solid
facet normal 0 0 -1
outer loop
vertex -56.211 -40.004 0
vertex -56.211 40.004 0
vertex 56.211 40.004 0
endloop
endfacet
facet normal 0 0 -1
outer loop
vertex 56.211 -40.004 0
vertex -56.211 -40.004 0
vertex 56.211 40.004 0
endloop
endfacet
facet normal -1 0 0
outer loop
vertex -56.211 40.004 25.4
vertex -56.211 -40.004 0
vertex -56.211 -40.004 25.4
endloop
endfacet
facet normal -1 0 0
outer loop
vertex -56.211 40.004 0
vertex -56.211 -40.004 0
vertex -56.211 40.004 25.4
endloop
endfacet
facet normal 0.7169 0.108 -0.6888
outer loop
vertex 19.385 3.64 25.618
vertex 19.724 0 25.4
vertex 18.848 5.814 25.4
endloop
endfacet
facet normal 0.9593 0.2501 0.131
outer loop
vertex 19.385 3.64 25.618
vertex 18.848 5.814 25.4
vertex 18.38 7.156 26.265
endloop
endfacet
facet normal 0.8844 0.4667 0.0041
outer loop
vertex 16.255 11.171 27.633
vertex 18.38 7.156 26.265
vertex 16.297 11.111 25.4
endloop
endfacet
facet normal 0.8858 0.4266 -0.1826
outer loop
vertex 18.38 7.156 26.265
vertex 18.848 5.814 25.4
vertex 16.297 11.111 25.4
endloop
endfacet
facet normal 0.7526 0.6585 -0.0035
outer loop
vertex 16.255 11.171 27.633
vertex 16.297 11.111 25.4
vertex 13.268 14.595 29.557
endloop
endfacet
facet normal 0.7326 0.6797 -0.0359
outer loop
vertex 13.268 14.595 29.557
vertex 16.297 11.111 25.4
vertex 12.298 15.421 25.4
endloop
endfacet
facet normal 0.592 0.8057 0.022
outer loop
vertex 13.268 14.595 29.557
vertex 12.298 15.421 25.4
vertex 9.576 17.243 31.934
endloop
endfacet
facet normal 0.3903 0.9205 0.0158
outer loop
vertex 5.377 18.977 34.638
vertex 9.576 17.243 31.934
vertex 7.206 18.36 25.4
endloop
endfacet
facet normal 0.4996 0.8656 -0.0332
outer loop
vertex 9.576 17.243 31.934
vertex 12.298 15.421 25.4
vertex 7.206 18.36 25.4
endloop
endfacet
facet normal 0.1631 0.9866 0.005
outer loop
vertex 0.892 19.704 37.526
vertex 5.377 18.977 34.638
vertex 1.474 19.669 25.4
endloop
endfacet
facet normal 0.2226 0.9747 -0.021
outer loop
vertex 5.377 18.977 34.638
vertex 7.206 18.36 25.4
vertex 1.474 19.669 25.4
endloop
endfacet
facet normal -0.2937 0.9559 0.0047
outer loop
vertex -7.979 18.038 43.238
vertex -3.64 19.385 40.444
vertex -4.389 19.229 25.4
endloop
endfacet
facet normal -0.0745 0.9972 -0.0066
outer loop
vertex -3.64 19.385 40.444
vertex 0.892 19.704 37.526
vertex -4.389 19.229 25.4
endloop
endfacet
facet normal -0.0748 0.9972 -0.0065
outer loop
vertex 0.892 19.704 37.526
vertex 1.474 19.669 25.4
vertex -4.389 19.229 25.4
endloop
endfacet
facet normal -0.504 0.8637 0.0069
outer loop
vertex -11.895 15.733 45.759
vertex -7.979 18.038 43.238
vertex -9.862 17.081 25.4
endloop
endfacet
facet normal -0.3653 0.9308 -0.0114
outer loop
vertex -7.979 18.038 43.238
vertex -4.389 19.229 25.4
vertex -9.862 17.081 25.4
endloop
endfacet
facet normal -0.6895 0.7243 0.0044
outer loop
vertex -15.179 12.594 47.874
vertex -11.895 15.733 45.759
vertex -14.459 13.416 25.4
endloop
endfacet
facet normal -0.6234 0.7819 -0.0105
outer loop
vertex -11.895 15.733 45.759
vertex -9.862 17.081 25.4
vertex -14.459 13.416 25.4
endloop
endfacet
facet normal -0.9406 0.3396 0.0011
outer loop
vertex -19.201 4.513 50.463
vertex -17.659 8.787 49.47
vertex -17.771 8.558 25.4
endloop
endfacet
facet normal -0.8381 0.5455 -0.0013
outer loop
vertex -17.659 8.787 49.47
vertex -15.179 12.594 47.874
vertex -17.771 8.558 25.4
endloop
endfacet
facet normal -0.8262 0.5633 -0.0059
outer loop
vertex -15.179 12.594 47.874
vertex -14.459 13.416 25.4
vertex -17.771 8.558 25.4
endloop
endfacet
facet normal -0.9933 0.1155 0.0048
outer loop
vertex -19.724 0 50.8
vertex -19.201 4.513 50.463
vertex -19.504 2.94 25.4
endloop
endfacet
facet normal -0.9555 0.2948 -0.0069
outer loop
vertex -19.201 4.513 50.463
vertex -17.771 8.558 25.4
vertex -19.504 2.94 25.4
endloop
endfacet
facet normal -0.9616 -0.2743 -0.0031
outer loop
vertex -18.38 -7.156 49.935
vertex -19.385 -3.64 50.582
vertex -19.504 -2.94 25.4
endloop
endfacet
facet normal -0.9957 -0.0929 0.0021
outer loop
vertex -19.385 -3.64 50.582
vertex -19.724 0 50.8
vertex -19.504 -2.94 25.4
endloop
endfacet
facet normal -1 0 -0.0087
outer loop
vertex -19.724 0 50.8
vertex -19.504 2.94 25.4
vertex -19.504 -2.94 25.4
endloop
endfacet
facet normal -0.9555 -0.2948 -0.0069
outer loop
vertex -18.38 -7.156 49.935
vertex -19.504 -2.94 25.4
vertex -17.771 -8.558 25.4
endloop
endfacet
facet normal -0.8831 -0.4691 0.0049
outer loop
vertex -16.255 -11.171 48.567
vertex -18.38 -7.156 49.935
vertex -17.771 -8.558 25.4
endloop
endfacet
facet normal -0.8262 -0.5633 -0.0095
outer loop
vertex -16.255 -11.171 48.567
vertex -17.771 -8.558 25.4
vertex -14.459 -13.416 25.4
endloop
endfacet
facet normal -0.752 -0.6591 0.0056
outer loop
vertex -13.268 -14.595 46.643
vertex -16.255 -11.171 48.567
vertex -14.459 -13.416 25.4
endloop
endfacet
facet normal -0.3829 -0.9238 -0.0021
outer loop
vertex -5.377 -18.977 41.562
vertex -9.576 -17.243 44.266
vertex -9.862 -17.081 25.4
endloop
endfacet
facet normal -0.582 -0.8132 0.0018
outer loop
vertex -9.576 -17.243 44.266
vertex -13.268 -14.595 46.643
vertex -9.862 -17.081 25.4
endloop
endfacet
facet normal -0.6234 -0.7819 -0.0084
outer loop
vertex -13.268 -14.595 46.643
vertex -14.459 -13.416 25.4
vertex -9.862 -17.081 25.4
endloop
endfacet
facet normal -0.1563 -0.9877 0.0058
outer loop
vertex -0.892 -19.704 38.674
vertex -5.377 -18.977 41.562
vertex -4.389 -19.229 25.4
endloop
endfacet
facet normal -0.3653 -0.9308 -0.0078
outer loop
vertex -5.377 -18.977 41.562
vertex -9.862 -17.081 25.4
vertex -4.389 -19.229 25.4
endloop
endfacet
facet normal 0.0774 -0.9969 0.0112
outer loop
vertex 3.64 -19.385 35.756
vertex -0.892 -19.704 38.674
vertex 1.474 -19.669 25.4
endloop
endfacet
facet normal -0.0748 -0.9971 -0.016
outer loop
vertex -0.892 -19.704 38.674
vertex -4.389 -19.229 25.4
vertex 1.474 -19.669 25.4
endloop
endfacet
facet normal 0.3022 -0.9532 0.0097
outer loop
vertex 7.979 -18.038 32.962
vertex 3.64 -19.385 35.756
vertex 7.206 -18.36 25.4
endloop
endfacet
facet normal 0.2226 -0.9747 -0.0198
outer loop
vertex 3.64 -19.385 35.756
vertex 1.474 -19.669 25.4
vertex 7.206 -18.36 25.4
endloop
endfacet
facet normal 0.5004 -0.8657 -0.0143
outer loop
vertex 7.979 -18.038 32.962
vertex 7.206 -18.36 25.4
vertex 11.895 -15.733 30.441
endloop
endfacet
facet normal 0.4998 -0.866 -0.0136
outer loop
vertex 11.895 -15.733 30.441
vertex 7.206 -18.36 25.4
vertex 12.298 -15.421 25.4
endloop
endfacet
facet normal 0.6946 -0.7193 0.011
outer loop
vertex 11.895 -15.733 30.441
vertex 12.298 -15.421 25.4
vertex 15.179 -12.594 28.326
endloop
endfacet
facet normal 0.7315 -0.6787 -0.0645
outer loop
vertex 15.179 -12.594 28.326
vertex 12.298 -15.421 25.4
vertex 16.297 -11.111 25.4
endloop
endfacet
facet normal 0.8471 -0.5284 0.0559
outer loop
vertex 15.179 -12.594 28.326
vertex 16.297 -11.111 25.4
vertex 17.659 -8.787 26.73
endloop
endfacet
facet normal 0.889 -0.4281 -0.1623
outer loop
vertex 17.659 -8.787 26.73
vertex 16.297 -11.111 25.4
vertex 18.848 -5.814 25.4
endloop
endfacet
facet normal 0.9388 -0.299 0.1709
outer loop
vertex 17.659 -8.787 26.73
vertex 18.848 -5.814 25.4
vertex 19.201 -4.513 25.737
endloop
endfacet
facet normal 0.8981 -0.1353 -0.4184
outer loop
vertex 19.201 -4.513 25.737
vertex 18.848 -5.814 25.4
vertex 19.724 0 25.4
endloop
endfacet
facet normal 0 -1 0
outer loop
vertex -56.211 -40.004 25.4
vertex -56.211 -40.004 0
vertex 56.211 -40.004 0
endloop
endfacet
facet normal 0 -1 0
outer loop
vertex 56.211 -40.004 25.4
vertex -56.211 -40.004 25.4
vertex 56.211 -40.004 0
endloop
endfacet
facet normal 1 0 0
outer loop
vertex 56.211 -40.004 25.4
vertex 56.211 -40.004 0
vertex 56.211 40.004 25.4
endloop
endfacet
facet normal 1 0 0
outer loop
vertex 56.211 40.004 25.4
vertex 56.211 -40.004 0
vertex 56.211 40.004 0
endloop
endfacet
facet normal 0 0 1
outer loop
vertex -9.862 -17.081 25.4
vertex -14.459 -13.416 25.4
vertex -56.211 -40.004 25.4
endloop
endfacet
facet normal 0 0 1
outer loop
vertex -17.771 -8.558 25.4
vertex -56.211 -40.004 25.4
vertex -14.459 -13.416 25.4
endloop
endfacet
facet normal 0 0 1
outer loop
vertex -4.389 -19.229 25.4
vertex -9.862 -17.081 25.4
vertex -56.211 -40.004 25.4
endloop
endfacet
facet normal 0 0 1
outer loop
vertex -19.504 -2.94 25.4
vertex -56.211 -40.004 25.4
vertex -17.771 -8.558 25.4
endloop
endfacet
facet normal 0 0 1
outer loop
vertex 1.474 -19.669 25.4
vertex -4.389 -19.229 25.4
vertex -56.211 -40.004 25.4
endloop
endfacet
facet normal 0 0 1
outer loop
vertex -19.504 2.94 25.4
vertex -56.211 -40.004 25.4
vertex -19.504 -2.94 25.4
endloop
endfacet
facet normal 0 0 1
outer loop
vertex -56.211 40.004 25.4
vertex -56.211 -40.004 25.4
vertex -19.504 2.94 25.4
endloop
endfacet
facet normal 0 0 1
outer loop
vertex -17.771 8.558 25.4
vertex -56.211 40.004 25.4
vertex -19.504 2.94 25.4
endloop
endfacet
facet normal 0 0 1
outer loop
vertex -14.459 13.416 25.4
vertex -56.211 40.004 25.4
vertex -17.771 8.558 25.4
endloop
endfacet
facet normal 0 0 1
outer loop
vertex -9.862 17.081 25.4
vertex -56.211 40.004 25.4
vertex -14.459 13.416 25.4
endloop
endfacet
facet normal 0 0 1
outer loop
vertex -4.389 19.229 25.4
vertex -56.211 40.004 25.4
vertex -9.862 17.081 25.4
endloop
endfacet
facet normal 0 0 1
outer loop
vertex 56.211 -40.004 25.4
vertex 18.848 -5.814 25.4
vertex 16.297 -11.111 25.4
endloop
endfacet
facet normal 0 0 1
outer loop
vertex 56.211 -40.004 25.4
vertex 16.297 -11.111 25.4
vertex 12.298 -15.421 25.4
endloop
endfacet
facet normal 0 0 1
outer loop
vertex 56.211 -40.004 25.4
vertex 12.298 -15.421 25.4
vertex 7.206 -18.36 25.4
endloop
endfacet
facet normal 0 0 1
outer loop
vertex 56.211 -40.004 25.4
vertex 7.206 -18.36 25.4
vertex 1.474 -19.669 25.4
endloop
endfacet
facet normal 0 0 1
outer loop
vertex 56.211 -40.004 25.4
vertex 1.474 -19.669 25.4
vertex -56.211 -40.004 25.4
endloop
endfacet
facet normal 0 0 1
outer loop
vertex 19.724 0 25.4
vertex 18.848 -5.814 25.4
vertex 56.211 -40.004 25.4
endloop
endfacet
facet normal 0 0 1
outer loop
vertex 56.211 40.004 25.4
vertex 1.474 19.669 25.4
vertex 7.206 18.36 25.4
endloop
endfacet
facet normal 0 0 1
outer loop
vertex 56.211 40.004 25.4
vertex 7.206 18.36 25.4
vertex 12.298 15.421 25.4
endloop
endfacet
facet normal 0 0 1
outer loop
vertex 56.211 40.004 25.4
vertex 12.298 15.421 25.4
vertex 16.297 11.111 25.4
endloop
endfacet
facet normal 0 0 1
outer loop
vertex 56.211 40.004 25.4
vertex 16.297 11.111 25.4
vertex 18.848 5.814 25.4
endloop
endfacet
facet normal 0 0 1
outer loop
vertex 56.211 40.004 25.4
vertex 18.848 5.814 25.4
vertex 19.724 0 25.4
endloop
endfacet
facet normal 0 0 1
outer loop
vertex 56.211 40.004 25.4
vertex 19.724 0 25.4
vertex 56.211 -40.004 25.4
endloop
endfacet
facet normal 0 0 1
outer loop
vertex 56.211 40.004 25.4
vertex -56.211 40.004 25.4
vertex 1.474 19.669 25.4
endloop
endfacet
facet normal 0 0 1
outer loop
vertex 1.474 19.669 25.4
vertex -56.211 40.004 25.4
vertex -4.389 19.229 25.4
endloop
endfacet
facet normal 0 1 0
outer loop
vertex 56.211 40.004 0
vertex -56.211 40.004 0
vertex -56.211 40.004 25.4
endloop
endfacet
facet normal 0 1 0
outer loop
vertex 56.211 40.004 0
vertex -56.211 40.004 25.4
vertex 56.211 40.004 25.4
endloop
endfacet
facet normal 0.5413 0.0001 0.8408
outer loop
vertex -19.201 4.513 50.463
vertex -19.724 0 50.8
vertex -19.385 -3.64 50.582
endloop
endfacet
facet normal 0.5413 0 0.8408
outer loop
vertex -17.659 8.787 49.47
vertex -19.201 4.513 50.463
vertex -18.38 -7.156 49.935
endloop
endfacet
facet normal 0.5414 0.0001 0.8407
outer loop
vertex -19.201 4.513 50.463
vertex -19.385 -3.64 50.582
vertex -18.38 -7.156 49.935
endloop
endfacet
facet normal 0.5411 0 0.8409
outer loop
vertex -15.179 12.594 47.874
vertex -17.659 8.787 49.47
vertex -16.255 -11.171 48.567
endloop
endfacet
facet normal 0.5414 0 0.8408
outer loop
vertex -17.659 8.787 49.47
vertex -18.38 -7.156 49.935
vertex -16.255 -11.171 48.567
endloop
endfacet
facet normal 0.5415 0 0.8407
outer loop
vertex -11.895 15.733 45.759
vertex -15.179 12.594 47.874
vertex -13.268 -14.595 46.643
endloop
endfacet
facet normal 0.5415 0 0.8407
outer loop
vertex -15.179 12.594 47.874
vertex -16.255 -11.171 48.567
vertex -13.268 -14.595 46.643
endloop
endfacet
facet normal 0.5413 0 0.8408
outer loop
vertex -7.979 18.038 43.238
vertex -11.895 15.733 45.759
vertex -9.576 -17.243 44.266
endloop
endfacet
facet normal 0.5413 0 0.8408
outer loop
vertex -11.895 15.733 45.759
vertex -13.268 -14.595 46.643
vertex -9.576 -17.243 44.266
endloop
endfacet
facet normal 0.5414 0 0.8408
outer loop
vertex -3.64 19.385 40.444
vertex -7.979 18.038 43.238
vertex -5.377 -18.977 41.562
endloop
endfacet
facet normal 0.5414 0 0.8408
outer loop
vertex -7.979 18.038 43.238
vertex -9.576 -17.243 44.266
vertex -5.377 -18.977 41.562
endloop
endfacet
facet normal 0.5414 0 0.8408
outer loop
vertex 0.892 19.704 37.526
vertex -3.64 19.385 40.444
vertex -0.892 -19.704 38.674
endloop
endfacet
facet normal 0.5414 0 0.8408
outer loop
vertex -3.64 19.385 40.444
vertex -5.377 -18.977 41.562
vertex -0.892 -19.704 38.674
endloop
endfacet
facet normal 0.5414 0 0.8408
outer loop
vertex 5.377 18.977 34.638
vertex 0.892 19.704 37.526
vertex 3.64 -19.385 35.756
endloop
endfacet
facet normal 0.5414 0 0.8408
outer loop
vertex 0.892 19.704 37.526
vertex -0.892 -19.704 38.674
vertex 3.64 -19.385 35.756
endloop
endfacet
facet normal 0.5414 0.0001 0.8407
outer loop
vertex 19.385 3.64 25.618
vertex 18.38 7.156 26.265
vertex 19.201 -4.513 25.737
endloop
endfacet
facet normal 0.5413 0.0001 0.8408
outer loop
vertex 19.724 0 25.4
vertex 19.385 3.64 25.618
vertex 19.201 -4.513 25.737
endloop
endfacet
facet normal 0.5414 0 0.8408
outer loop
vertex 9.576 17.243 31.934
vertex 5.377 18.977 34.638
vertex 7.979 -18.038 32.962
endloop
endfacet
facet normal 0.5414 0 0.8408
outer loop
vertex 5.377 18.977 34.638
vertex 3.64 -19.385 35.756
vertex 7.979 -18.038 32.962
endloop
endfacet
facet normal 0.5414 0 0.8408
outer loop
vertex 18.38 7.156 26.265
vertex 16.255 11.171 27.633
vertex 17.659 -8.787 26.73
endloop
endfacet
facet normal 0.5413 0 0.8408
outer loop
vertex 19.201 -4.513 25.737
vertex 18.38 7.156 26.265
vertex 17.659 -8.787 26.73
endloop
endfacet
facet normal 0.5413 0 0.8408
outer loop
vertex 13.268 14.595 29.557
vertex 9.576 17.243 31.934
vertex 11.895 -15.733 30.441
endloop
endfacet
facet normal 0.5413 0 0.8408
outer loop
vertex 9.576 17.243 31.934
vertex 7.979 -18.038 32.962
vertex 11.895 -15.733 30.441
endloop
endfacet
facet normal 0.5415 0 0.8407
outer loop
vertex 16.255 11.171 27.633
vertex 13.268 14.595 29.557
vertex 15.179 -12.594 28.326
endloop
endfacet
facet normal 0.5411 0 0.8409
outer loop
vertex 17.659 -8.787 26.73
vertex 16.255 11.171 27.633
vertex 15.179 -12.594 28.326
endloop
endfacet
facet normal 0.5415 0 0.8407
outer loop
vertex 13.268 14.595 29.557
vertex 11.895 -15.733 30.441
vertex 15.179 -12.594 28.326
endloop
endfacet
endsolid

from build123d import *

# Parameters (mm, degrees)
F0_W     = 112.421236
F0_H     = 80.008708
F1_DEPTH = 25.4
F2_R     = 19.723865
F3_DEPTH = 50.8
F5_DEPTH = 80.009708


with BuildPart() as f1:
    # F0 (on Top) → F1 (new body)
    with BuildSketch(Plane.XY):
        Rectangle(F0_W, F0_H)
    extrude(amount=F1_DEPTH)

    # F2 (on Top) → F3 (join)
    with BuildSketch(Plane.XY):
        Circle(F2_R)
    extrude(amount=F3_DEPTH)

    # F4 (on face) → F5 (cut, through all)
    with BuildSketch(Plane.XZ.offset(40.004354)):
        Polygon((19.723865, 50.8), (-19.723865, 50.8), (19.723865, 25.4), align=None)
    extrude(amount=-F5_DEPTH, mode=Mode.SUBTRACT)


solid = f1.part
